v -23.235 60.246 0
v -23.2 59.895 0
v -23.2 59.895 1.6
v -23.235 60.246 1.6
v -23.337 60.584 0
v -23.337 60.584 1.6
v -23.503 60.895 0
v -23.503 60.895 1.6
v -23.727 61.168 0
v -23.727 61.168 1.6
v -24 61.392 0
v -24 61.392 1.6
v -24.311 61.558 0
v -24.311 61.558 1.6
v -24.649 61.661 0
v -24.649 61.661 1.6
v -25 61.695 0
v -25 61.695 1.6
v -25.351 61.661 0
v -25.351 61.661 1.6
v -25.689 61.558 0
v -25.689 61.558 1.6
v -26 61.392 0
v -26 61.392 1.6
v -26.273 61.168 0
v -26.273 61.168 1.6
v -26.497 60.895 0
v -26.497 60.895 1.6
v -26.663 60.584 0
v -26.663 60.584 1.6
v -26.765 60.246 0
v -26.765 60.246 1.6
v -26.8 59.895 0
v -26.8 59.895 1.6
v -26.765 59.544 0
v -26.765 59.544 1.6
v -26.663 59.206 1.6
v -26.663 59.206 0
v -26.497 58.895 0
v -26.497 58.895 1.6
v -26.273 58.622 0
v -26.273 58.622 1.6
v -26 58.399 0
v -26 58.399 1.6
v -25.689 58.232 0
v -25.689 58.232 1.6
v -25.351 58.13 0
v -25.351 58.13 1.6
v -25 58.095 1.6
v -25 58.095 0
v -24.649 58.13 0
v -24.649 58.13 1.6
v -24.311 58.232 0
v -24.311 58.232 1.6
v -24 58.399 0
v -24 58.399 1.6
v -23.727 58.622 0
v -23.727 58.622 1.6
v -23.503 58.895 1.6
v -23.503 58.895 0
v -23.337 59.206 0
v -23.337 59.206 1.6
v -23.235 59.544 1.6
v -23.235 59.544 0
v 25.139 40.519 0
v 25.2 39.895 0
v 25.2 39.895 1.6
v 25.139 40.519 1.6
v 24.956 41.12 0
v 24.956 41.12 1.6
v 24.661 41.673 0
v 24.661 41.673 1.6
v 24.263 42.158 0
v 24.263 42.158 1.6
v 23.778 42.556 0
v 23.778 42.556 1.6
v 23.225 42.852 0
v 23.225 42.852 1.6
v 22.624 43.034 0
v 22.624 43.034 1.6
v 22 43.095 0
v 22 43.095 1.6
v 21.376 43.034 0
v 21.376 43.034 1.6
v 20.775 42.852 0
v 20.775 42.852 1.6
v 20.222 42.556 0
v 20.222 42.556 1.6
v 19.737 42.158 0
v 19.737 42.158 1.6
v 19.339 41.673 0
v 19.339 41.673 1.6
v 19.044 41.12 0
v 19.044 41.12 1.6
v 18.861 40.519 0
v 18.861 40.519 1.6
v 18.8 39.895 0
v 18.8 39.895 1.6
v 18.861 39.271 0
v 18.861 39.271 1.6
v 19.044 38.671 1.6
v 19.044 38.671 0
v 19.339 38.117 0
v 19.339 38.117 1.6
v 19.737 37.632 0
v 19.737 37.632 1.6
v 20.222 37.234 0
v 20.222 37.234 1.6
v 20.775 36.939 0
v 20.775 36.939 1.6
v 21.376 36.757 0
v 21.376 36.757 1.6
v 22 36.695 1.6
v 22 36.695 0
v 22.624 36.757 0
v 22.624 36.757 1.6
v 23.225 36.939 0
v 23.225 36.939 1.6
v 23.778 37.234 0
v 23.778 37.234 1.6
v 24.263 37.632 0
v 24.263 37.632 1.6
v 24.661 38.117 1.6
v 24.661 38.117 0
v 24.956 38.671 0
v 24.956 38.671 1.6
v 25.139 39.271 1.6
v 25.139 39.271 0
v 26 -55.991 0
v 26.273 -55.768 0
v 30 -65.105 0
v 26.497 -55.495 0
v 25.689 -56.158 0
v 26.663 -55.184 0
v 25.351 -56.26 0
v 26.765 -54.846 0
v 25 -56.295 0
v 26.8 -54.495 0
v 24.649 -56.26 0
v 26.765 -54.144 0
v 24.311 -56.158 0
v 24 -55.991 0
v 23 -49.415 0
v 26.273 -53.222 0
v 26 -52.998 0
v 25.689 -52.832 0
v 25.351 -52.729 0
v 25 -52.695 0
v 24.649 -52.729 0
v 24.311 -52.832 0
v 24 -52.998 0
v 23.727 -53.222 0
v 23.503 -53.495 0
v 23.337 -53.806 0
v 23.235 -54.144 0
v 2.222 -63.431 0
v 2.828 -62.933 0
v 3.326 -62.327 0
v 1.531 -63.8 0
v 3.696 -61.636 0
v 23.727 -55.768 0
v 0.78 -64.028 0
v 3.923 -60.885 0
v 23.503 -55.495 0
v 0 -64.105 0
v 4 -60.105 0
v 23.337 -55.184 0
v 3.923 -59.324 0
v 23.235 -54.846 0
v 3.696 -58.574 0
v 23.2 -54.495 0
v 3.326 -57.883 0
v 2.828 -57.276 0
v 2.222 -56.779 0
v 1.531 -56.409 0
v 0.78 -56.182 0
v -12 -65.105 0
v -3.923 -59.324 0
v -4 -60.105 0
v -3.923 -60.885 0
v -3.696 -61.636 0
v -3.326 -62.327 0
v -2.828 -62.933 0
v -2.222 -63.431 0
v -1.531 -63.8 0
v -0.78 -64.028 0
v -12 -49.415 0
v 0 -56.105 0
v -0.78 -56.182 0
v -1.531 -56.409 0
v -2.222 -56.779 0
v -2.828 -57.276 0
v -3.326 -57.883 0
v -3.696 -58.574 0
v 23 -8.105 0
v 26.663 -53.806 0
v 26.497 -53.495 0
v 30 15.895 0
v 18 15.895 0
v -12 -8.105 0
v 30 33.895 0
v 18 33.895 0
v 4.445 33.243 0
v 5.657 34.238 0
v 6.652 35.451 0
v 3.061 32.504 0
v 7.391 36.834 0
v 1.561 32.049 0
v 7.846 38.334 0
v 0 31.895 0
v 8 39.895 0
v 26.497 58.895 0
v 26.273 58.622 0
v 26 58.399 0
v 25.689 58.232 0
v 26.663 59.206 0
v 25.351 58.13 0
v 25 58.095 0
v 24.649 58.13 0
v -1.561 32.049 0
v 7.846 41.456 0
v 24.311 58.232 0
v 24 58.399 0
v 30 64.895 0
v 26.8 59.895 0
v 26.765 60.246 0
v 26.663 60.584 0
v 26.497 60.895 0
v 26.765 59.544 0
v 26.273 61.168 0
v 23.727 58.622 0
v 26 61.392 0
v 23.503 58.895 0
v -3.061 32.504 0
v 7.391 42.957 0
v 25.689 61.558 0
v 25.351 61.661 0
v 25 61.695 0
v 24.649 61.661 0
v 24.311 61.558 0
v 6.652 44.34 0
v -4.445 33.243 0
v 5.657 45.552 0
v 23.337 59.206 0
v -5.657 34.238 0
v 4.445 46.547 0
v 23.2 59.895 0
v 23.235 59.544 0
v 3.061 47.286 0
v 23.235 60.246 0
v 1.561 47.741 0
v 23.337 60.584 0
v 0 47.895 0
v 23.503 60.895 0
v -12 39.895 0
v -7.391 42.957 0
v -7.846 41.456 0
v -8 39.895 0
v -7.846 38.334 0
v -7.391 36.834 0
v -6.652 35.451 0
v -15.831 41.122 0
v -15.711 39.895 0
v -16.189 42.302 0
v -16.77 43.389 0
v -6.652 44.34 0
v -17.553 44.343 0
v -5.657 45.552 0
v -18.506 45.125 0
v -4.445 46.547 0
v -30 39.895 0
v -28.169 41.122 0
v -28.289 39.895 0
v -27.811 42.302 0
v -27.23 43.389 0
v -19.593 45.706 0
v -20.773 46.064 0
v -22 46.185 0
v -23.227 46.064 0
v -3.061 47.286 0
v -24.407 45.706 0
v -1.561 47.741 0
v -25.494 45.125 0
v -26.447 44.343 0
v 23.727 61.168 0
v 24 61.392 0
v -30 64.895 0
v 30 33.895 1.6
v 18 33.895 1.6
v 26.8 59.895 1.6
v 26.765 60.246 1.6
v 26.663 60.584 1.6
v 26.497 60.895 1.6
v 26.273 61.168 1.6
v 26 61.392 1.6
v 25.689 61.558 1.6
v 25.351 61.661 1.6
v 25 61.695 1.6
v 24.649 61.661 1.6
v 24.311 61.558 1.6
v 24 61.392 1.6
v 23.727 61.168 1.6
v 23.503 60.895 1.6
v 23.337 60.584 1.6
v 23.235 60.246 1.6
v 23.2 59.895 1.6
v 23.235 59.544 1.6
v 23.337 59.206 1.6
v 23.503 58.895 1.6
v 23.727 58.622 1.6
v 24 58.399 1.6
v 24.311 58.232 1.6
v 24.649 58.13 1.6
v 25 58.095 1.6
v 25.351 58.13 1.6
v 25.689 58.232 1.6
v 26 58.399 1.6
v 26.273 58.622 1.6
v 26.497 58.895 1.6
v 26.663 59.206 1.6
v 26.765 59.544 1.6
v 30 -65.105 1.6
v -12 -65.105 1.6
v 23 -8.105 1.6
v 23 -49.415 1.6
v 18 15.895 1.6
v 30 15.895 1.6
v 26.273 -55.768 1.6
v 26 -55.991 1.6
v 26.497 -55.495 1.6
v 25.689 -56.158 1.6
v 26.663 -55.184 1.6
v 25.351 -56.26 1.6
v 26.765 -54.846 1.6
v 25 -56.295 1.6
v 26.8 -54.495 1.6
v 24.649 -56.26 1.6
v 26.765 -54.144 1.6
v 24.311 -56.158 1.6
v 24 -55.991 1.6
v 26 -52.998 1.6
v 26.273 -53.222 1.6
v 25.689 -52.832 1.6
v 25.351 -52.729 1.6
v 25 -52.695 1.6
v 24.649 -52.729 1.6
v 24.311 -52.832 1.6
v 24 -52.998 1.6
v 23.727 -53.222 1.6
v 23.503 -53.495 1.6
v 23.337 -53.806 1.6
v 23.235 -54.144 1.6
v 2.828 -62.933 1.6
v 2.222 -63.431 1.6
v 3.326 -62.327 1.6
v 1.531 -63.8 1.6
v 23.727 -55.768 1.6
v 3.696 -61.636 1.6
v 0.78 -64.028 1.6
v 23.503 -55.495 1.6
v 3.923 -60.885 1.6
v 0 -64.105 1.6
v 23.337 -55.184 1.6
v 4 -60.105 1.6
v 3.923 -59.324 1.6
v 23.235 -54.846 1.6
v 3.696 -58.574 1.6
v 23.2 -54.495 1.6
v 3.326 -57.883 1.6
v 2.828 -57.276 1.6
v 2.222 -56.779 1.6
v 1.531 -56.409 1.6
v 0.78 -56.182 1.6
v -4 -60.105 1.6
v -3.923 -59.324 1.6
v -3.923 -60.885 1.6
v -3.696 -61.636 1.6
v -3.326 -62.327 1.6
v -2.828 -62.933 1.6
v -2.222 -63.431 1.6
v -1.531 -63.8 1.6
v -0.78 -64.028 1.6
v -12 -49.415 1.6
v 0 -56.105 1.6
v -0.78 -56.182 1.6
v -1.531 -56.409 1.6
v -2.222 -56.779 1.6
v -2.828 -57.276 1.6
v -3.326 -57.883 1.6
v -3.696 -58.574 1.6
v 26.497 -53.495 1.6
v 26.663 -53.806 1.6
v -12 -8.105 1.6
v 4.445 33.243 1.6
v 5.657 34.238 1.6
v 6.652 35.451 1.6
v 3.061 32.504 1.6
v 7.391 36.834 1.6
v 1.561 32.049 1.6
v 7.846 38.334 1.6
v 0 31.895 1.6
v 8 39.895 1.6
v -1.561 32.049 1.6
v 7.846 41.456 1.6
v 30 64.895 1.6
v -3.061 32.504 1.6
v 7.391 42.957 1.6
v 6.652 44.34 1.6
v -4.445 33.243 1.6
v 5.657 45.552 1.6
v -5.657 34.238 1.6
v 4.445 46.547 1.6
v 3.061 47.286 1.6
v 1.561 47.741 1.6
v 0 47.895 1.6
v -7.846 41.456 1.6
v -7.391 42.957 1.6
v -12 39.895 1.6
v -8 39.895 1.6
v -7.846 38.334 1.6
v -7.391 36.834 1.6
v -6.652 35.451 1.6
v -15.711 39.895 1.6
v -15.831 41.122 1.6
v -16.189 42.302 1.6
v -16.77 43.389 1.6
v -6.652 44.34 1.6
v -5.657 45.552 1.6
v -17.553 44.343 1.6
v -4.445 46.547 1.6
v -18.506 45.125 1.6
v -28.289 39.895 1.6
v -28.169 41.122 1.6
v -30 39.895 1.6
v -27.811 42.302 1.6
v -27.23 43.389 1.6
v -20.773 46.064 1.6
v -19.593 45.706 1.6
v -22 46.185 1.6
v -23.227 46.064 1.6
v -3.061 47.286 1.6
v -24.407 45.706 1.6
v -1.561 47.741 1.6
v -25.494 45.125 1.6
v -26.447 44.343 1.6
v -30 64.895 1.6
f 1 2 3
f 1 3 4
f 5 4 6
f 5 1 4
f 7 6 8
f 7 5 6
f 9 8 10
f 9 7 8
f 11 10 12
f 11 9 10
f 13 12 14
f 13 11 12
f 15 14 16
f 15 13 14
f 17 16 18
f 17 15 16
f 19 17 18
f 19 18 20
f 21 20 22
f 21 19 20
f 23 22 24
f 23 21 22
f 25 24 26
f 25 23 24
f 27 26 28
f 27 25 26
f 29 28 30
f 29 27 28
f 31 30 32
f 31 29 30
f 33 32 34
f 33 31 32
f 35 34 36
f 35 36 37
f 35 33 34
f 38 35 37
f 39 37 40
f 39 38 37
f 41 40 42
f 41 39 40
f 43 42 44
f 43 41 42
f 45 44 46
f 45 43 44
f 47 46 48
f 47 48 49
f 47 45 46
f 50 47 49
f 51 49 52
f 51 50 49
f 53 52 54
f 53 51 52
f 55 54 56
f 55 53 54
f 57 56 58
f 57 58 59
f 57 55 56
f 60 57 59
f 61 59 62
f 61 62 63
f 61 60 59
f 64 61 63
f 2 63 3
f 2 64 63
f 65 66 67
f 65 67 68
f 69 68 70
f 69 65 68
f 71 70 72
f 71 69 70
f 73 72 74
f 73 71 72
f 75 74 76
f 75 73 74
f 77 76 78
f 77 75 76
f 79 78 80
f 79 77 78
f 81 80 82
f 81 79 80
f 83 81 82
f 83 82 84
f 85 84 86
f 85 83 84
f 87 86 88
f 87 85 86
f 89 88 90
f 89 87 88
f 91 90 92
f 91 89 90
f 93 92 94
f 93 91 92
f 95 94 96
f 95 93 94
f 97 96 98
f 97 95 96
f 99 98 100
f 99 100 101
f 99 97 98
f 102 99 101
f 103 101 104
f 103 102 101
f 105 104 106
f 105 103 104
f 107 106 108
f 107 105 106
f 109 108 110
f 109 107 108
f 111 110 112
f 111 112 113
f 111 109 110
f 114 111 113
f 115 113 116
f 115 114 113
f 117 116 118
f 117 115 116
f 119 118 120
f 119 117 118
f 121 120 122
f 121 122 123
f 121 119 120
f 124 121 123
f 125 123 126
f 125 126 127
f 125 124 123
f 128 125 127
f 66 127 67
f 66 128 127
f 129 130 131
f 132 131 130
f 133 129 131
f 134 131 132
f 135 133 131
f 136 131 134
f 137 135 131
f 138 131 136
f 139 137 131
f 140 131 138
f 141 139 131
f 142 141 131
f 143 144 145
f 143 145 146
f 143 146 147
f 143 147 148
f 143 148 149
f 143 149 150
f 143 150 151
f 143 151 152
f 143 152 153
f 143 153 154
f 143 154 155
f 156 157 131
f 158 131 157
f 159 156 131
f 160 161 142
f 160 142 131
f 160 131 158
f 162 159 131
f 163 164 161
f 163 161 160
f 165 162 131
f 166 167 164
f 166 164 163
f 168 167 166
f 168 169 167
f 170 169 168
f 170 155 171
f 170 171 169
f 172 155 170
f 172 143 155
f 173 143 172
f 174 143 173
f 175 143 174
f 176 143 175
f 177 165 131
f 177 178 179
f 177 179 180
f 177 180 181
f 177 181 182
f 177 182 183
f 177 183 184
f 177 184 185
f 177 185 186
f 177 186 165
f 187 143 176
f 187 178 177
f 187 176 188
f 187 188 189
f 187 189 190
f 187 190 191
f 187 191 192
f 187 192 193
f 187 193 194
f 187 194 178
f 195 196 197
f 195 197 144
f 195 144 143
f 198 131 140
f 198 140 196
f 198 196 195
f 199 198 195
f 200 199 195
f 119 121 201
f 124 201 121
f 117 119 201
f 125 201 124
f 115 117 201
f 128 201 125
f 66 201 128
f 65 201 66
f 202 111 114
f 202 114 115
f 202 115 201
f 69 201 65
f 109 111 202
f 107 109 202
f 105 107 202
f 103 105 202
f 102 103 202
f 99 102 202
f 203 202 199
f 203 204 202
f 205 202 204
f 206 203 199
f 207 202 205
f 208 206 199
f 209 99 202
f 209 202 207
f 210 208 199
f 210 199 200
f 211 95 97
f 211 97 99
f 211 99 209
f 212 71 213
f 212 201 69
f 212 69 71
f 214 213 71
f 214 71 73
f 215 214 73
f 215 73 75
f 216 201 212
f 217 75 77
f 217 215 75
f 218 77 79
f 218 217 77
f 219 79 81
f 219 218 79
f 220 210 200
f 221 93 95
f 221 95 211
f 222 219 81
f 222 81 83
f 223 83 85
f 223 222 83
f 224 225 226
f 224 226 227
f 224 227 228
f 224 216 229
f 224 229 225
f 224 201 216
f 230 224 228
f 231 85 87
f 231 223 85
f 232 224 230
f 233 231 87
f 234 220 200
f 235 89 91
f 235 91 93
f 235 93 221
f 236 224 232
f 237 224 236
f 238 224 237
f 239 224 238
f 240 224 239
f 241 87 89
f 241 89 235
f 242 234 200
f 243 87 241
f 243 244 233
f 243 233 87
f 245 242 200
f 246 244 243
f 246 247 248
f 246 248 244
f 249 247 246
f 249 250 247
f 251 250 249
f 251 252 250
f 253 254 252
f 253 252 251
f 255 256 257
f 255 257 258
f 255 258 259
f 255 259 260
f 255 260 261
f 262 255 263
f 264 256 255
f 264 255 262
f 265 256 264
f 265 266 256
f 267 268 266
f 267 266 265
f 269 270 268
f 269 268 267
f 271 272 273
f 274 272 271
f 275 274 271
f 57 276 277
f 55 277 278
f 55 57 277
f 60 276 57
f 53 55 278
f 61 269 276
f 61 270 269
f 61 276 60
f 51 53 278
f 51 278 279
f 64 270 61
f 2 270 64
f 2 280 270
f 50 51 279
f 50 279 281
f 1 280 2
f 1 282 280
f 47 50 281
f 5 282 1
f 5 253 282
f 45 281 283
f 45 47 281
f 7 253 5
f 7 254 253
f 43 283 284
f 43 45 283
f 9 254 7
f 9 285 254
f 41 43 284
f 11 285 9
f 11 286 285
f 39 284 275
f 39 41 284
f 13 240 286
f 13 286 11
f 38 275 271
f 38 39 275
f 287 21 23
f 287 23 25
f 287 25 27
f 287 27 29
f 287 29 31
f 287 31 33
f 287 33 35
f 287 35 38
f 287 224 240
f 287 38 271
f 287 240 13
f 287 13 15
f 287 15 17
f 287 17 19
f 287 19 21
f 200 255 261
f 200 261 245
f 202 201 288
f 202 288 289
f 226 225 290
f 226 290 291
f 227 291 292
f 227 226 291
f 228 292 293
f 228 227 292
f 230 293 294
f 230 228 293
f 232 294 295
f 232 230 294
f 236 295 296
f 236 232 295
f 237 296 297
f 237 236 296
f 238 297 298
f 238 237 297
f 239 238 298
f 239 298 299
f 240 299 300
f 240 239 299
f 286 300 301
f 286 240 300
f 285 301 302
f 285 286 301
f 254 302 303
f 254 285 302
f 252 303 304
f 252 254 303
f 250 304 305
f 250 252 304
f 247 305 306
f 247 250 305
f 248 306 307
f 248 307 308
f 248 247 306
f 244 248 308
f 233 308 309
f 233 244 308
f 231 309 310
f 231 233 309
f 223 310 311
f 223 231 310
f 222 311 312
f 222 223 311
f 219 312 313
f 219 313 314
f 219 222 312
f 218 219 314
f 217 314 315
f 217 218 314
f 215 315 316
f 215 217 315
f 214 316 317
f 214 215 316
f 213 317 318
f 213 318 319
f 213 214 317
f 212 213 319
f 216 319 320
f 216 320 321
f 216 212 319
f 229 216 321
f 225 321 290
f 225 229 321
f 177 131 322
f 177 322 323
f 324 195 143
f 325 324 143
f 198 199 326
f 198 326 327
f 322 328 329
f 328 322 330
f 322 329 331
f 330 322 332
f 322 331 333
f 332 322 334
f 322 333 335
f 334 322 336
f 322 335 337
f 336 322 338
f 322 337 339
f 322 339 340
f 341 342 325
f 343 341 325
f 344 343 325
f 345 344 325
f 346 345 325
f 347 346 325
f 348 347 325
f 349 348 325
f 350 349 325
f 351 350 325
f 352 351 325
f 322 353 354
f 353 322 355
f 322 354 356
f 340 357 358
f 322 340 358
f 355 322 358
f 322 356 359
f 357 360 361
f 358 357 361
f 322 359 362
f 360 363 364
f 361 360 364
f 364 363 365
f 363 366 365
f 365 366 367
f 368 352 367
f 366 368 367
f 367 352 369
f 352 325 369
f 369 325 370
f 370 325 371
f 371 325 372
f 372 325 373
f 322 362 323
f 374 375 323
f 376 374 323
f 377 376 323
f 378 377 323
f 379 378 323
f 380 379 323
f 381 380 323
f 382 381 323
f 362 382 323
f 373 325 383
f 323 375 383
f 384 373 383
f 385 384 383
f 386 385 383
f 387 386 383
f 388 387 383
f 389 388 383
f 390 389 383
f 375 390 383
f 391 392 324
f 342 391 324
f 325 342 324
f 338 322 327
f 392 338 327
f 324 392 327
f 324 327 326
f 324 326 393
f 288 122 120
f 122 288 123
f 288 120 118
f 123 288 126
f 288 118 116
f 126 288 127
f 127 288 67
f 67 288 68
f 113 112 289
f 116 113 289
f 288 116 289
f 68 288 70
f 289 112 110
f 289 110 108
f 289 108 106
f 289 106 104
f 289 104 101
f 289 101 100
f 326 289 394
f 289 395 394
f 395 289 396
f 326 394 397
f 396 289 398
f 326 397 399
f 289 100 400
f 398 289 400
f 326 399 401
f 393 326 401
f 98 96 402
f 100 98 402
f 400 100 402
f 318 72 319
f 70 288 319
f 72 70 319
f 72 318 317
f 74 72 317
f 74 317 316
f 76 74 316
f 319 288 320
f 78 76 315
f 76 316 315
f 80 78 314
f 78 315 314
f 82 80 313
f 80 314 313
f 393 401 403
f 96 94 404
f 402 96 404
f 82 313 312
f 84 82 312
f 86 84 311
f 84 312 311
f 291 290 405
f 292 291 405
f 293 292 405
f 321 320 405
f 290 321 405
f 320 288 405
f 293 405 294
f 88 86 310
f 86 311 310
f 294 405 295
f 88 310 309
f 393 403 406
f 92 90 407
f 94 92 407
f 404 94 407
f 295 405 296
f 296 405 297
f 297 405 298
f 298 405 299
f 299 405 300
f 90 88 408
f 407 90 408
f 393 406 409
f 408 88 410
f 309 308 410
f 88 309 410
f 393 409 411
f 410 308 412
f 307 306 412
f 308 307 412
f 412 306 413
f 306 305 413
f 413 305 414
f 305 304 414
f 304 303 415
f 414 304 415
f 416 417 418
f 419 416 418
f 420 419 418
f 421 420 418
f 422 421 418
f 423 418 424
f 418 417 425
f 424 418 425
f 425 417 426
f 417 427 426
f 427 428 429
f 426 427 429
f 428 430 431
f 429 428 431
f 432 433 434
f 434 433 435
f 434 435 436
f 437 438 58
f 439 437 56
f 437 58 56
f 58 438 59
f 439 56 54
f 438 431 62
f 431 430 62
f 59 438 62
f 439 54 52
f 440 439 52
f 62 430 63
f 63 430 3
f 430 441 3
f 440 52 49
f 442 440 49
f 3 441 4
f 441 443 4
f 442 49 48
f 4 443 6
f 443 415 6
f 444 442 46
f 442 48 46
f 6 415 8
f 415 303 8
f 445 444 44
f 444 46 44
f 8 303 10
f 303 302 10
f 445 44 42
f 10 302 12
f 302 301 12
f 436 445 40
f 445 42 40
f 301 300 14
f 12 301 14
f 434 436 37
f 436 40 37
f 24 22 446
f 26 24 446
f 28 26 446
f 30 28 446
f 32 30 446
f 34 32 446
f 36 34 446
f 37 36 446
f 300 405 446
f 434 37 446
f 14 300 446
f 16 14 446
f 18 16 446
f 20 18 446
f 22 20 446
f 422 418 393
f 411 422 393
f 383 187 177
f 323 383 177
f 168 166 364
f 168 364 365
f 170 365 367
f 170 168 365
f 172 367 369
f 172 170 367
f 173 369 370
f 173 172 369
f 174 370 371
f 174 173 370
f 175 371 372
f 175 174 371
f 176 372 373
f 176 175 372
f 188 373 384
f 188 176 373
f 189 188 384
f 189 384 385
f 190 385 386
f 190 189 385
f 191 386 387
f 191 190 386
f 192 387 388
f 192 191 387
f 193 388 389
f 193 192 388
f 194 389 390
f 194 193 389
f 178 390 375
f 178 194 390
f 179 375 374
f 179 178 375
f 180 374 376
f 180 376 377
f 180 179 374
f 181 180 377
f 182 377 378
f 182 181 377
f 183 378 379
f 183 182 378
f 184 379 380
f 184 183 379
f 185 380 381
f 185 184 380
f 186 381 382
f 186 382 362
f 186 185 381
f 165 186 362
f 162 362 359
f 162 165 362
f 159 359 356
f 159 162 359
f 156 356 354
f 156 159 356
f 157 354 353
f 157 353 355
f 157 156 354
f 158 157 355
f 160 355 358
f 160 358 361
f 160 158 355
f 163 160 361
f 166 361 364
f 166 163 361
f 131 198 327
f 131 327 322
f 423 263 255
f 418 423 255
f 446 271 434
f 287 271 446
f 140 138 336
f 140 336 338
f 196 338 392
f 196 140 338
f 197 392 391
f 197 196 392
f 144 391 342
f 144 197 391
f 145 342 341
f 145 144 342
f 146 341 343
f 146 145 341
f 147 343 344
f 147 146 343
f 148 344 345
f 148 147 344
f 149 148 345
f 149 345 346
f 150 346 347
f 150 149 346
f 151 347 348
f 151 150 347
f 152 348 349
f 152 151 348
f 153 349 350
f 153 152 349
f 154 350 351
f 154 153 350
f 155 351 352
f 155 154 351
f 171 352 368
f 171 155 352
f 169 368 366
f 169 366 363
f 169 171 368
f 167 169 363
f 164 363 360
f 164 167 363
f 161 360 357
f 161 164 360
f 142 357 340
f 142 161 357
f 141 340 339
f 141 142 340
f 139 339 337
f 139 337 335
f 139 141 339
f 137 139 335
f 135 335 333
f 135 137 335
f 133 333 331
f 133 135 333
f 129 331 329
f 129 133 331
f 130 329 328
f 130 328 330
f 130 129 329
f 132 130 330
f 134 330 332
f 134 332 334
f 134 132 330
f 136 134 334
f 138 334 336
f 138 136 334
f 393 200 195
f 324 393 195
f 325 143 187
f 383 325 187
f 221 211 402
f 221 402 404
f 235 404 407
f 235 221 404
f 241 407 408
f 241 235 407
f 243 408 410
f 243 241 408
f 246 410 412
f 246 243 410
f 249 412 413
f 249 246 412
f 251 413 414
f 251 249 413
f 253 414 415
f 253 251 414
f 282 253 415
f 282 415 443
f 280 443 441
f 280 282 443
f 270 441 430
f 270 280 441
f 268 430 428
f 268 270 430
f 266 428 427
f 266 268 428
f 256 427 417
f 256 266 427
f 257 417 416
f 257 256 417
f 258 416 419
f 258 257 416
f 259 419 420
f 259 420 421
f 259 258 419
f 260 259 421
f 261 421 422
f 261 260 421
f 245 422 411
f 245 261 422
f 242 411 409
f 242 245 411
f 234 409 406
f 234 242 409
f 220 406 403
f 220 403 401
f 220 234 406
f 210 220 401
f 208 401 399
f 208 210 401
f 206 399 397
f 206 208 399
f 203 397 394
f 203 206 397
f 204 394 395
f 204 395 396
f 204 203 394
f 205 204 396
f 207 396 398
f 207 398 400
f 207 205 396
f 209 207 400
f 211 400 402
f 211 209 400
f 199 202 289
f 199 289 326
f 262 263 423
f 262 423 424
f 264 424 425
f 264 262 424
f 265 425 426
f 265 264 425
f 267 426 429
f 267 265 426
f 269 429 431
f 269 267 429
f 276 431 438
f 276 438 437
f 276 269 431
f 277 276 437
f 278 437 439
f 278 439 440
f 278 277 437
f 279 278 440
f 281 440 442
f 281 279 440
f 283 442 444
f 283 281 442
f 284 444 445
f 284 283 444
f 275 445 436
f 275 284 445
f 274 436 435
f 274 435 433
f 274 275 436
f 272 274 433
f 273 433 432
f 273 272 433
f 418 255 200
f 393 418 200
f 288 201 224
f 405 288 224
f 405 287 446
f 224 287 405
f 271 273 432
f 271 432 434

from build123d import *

# Parameters (mm, degrees)
SKETCH_R   = 8
SKETCH_R_2 = 3.2
SKETCH_R_3 = 4
SKETCH_R_4 = 1.8
PAD_DEPTH  = 1.6


with BuildPart() as part:
    # Sketch → Pad (new body)
    with BuildSketch(Plane.XY):
        with BuildLine():
            ThreePointArc((-15.710509, 39.895164), (-22, 46.184654), (-28.289491, 39.895164))
            Line((-28.289491, 39.895164), (-30, 39.895164))
            Line((-30, 39.895164), (-30, 64.895162))
            Line((-30, 64.895162), (30, 64.895162))
            Line((30, 33.895162), (30, 64.895162))
            Line((30, 33.895162), (18, 33.895162))
            Line((18, 33.895162), (18, 15.895162))
            Line((18, 15.895162), (30, 15.895162))
            Line((30, 15.895162), (30, -65.104838))
            Line((30, -65.104838), (-12, -65.104838))
            Line((-12, -49.414836), (-12, -65.104838))
            Line((23, -49.414836), (-12, -49.414836))
            Line((23, -8.104836), (23, -49.414836))
            Line((3.490575, -8.104836), (23, -8.104836))
            Line((-3.490575, -8.104836), (3.490575, -8.104836))
            Line((-12, -8.104836), (-3.490575, -8.104836))
            Line((-12, 39.895164), (-12, -8.104836))
            Line((-15.710509, 39.895164), (-12, 39.895164))
        make_face()
        with Locations((0, 39.895164)):
            Circle(SKETCH_R, mode=Mode.SUBTRACT)
        with Locations((22, 39.895164)):
            Circle(SKETCH_R_2, mode=Mode.SUBTRACT)
        with Locations((0, -60.104838)):
            Circle(SKETCH_R_3, mode=Mode.SUBTRACT)
        with Locations((25, -54.494838)):
            Circle(SKETCH_R_4, mode=Mode.SUBTRACT)
        with Locations((25, 59.895164)):
            Circle(SKETCH_R_4, mode=Mode.SUBTRACT)
        with Locations((-25, 59.895162)):
            Circle(SKETCH_R_4, mode=Mode.SUBTRACT)
    extrude(amount=PAD_DEPTH)


solid = part.part
